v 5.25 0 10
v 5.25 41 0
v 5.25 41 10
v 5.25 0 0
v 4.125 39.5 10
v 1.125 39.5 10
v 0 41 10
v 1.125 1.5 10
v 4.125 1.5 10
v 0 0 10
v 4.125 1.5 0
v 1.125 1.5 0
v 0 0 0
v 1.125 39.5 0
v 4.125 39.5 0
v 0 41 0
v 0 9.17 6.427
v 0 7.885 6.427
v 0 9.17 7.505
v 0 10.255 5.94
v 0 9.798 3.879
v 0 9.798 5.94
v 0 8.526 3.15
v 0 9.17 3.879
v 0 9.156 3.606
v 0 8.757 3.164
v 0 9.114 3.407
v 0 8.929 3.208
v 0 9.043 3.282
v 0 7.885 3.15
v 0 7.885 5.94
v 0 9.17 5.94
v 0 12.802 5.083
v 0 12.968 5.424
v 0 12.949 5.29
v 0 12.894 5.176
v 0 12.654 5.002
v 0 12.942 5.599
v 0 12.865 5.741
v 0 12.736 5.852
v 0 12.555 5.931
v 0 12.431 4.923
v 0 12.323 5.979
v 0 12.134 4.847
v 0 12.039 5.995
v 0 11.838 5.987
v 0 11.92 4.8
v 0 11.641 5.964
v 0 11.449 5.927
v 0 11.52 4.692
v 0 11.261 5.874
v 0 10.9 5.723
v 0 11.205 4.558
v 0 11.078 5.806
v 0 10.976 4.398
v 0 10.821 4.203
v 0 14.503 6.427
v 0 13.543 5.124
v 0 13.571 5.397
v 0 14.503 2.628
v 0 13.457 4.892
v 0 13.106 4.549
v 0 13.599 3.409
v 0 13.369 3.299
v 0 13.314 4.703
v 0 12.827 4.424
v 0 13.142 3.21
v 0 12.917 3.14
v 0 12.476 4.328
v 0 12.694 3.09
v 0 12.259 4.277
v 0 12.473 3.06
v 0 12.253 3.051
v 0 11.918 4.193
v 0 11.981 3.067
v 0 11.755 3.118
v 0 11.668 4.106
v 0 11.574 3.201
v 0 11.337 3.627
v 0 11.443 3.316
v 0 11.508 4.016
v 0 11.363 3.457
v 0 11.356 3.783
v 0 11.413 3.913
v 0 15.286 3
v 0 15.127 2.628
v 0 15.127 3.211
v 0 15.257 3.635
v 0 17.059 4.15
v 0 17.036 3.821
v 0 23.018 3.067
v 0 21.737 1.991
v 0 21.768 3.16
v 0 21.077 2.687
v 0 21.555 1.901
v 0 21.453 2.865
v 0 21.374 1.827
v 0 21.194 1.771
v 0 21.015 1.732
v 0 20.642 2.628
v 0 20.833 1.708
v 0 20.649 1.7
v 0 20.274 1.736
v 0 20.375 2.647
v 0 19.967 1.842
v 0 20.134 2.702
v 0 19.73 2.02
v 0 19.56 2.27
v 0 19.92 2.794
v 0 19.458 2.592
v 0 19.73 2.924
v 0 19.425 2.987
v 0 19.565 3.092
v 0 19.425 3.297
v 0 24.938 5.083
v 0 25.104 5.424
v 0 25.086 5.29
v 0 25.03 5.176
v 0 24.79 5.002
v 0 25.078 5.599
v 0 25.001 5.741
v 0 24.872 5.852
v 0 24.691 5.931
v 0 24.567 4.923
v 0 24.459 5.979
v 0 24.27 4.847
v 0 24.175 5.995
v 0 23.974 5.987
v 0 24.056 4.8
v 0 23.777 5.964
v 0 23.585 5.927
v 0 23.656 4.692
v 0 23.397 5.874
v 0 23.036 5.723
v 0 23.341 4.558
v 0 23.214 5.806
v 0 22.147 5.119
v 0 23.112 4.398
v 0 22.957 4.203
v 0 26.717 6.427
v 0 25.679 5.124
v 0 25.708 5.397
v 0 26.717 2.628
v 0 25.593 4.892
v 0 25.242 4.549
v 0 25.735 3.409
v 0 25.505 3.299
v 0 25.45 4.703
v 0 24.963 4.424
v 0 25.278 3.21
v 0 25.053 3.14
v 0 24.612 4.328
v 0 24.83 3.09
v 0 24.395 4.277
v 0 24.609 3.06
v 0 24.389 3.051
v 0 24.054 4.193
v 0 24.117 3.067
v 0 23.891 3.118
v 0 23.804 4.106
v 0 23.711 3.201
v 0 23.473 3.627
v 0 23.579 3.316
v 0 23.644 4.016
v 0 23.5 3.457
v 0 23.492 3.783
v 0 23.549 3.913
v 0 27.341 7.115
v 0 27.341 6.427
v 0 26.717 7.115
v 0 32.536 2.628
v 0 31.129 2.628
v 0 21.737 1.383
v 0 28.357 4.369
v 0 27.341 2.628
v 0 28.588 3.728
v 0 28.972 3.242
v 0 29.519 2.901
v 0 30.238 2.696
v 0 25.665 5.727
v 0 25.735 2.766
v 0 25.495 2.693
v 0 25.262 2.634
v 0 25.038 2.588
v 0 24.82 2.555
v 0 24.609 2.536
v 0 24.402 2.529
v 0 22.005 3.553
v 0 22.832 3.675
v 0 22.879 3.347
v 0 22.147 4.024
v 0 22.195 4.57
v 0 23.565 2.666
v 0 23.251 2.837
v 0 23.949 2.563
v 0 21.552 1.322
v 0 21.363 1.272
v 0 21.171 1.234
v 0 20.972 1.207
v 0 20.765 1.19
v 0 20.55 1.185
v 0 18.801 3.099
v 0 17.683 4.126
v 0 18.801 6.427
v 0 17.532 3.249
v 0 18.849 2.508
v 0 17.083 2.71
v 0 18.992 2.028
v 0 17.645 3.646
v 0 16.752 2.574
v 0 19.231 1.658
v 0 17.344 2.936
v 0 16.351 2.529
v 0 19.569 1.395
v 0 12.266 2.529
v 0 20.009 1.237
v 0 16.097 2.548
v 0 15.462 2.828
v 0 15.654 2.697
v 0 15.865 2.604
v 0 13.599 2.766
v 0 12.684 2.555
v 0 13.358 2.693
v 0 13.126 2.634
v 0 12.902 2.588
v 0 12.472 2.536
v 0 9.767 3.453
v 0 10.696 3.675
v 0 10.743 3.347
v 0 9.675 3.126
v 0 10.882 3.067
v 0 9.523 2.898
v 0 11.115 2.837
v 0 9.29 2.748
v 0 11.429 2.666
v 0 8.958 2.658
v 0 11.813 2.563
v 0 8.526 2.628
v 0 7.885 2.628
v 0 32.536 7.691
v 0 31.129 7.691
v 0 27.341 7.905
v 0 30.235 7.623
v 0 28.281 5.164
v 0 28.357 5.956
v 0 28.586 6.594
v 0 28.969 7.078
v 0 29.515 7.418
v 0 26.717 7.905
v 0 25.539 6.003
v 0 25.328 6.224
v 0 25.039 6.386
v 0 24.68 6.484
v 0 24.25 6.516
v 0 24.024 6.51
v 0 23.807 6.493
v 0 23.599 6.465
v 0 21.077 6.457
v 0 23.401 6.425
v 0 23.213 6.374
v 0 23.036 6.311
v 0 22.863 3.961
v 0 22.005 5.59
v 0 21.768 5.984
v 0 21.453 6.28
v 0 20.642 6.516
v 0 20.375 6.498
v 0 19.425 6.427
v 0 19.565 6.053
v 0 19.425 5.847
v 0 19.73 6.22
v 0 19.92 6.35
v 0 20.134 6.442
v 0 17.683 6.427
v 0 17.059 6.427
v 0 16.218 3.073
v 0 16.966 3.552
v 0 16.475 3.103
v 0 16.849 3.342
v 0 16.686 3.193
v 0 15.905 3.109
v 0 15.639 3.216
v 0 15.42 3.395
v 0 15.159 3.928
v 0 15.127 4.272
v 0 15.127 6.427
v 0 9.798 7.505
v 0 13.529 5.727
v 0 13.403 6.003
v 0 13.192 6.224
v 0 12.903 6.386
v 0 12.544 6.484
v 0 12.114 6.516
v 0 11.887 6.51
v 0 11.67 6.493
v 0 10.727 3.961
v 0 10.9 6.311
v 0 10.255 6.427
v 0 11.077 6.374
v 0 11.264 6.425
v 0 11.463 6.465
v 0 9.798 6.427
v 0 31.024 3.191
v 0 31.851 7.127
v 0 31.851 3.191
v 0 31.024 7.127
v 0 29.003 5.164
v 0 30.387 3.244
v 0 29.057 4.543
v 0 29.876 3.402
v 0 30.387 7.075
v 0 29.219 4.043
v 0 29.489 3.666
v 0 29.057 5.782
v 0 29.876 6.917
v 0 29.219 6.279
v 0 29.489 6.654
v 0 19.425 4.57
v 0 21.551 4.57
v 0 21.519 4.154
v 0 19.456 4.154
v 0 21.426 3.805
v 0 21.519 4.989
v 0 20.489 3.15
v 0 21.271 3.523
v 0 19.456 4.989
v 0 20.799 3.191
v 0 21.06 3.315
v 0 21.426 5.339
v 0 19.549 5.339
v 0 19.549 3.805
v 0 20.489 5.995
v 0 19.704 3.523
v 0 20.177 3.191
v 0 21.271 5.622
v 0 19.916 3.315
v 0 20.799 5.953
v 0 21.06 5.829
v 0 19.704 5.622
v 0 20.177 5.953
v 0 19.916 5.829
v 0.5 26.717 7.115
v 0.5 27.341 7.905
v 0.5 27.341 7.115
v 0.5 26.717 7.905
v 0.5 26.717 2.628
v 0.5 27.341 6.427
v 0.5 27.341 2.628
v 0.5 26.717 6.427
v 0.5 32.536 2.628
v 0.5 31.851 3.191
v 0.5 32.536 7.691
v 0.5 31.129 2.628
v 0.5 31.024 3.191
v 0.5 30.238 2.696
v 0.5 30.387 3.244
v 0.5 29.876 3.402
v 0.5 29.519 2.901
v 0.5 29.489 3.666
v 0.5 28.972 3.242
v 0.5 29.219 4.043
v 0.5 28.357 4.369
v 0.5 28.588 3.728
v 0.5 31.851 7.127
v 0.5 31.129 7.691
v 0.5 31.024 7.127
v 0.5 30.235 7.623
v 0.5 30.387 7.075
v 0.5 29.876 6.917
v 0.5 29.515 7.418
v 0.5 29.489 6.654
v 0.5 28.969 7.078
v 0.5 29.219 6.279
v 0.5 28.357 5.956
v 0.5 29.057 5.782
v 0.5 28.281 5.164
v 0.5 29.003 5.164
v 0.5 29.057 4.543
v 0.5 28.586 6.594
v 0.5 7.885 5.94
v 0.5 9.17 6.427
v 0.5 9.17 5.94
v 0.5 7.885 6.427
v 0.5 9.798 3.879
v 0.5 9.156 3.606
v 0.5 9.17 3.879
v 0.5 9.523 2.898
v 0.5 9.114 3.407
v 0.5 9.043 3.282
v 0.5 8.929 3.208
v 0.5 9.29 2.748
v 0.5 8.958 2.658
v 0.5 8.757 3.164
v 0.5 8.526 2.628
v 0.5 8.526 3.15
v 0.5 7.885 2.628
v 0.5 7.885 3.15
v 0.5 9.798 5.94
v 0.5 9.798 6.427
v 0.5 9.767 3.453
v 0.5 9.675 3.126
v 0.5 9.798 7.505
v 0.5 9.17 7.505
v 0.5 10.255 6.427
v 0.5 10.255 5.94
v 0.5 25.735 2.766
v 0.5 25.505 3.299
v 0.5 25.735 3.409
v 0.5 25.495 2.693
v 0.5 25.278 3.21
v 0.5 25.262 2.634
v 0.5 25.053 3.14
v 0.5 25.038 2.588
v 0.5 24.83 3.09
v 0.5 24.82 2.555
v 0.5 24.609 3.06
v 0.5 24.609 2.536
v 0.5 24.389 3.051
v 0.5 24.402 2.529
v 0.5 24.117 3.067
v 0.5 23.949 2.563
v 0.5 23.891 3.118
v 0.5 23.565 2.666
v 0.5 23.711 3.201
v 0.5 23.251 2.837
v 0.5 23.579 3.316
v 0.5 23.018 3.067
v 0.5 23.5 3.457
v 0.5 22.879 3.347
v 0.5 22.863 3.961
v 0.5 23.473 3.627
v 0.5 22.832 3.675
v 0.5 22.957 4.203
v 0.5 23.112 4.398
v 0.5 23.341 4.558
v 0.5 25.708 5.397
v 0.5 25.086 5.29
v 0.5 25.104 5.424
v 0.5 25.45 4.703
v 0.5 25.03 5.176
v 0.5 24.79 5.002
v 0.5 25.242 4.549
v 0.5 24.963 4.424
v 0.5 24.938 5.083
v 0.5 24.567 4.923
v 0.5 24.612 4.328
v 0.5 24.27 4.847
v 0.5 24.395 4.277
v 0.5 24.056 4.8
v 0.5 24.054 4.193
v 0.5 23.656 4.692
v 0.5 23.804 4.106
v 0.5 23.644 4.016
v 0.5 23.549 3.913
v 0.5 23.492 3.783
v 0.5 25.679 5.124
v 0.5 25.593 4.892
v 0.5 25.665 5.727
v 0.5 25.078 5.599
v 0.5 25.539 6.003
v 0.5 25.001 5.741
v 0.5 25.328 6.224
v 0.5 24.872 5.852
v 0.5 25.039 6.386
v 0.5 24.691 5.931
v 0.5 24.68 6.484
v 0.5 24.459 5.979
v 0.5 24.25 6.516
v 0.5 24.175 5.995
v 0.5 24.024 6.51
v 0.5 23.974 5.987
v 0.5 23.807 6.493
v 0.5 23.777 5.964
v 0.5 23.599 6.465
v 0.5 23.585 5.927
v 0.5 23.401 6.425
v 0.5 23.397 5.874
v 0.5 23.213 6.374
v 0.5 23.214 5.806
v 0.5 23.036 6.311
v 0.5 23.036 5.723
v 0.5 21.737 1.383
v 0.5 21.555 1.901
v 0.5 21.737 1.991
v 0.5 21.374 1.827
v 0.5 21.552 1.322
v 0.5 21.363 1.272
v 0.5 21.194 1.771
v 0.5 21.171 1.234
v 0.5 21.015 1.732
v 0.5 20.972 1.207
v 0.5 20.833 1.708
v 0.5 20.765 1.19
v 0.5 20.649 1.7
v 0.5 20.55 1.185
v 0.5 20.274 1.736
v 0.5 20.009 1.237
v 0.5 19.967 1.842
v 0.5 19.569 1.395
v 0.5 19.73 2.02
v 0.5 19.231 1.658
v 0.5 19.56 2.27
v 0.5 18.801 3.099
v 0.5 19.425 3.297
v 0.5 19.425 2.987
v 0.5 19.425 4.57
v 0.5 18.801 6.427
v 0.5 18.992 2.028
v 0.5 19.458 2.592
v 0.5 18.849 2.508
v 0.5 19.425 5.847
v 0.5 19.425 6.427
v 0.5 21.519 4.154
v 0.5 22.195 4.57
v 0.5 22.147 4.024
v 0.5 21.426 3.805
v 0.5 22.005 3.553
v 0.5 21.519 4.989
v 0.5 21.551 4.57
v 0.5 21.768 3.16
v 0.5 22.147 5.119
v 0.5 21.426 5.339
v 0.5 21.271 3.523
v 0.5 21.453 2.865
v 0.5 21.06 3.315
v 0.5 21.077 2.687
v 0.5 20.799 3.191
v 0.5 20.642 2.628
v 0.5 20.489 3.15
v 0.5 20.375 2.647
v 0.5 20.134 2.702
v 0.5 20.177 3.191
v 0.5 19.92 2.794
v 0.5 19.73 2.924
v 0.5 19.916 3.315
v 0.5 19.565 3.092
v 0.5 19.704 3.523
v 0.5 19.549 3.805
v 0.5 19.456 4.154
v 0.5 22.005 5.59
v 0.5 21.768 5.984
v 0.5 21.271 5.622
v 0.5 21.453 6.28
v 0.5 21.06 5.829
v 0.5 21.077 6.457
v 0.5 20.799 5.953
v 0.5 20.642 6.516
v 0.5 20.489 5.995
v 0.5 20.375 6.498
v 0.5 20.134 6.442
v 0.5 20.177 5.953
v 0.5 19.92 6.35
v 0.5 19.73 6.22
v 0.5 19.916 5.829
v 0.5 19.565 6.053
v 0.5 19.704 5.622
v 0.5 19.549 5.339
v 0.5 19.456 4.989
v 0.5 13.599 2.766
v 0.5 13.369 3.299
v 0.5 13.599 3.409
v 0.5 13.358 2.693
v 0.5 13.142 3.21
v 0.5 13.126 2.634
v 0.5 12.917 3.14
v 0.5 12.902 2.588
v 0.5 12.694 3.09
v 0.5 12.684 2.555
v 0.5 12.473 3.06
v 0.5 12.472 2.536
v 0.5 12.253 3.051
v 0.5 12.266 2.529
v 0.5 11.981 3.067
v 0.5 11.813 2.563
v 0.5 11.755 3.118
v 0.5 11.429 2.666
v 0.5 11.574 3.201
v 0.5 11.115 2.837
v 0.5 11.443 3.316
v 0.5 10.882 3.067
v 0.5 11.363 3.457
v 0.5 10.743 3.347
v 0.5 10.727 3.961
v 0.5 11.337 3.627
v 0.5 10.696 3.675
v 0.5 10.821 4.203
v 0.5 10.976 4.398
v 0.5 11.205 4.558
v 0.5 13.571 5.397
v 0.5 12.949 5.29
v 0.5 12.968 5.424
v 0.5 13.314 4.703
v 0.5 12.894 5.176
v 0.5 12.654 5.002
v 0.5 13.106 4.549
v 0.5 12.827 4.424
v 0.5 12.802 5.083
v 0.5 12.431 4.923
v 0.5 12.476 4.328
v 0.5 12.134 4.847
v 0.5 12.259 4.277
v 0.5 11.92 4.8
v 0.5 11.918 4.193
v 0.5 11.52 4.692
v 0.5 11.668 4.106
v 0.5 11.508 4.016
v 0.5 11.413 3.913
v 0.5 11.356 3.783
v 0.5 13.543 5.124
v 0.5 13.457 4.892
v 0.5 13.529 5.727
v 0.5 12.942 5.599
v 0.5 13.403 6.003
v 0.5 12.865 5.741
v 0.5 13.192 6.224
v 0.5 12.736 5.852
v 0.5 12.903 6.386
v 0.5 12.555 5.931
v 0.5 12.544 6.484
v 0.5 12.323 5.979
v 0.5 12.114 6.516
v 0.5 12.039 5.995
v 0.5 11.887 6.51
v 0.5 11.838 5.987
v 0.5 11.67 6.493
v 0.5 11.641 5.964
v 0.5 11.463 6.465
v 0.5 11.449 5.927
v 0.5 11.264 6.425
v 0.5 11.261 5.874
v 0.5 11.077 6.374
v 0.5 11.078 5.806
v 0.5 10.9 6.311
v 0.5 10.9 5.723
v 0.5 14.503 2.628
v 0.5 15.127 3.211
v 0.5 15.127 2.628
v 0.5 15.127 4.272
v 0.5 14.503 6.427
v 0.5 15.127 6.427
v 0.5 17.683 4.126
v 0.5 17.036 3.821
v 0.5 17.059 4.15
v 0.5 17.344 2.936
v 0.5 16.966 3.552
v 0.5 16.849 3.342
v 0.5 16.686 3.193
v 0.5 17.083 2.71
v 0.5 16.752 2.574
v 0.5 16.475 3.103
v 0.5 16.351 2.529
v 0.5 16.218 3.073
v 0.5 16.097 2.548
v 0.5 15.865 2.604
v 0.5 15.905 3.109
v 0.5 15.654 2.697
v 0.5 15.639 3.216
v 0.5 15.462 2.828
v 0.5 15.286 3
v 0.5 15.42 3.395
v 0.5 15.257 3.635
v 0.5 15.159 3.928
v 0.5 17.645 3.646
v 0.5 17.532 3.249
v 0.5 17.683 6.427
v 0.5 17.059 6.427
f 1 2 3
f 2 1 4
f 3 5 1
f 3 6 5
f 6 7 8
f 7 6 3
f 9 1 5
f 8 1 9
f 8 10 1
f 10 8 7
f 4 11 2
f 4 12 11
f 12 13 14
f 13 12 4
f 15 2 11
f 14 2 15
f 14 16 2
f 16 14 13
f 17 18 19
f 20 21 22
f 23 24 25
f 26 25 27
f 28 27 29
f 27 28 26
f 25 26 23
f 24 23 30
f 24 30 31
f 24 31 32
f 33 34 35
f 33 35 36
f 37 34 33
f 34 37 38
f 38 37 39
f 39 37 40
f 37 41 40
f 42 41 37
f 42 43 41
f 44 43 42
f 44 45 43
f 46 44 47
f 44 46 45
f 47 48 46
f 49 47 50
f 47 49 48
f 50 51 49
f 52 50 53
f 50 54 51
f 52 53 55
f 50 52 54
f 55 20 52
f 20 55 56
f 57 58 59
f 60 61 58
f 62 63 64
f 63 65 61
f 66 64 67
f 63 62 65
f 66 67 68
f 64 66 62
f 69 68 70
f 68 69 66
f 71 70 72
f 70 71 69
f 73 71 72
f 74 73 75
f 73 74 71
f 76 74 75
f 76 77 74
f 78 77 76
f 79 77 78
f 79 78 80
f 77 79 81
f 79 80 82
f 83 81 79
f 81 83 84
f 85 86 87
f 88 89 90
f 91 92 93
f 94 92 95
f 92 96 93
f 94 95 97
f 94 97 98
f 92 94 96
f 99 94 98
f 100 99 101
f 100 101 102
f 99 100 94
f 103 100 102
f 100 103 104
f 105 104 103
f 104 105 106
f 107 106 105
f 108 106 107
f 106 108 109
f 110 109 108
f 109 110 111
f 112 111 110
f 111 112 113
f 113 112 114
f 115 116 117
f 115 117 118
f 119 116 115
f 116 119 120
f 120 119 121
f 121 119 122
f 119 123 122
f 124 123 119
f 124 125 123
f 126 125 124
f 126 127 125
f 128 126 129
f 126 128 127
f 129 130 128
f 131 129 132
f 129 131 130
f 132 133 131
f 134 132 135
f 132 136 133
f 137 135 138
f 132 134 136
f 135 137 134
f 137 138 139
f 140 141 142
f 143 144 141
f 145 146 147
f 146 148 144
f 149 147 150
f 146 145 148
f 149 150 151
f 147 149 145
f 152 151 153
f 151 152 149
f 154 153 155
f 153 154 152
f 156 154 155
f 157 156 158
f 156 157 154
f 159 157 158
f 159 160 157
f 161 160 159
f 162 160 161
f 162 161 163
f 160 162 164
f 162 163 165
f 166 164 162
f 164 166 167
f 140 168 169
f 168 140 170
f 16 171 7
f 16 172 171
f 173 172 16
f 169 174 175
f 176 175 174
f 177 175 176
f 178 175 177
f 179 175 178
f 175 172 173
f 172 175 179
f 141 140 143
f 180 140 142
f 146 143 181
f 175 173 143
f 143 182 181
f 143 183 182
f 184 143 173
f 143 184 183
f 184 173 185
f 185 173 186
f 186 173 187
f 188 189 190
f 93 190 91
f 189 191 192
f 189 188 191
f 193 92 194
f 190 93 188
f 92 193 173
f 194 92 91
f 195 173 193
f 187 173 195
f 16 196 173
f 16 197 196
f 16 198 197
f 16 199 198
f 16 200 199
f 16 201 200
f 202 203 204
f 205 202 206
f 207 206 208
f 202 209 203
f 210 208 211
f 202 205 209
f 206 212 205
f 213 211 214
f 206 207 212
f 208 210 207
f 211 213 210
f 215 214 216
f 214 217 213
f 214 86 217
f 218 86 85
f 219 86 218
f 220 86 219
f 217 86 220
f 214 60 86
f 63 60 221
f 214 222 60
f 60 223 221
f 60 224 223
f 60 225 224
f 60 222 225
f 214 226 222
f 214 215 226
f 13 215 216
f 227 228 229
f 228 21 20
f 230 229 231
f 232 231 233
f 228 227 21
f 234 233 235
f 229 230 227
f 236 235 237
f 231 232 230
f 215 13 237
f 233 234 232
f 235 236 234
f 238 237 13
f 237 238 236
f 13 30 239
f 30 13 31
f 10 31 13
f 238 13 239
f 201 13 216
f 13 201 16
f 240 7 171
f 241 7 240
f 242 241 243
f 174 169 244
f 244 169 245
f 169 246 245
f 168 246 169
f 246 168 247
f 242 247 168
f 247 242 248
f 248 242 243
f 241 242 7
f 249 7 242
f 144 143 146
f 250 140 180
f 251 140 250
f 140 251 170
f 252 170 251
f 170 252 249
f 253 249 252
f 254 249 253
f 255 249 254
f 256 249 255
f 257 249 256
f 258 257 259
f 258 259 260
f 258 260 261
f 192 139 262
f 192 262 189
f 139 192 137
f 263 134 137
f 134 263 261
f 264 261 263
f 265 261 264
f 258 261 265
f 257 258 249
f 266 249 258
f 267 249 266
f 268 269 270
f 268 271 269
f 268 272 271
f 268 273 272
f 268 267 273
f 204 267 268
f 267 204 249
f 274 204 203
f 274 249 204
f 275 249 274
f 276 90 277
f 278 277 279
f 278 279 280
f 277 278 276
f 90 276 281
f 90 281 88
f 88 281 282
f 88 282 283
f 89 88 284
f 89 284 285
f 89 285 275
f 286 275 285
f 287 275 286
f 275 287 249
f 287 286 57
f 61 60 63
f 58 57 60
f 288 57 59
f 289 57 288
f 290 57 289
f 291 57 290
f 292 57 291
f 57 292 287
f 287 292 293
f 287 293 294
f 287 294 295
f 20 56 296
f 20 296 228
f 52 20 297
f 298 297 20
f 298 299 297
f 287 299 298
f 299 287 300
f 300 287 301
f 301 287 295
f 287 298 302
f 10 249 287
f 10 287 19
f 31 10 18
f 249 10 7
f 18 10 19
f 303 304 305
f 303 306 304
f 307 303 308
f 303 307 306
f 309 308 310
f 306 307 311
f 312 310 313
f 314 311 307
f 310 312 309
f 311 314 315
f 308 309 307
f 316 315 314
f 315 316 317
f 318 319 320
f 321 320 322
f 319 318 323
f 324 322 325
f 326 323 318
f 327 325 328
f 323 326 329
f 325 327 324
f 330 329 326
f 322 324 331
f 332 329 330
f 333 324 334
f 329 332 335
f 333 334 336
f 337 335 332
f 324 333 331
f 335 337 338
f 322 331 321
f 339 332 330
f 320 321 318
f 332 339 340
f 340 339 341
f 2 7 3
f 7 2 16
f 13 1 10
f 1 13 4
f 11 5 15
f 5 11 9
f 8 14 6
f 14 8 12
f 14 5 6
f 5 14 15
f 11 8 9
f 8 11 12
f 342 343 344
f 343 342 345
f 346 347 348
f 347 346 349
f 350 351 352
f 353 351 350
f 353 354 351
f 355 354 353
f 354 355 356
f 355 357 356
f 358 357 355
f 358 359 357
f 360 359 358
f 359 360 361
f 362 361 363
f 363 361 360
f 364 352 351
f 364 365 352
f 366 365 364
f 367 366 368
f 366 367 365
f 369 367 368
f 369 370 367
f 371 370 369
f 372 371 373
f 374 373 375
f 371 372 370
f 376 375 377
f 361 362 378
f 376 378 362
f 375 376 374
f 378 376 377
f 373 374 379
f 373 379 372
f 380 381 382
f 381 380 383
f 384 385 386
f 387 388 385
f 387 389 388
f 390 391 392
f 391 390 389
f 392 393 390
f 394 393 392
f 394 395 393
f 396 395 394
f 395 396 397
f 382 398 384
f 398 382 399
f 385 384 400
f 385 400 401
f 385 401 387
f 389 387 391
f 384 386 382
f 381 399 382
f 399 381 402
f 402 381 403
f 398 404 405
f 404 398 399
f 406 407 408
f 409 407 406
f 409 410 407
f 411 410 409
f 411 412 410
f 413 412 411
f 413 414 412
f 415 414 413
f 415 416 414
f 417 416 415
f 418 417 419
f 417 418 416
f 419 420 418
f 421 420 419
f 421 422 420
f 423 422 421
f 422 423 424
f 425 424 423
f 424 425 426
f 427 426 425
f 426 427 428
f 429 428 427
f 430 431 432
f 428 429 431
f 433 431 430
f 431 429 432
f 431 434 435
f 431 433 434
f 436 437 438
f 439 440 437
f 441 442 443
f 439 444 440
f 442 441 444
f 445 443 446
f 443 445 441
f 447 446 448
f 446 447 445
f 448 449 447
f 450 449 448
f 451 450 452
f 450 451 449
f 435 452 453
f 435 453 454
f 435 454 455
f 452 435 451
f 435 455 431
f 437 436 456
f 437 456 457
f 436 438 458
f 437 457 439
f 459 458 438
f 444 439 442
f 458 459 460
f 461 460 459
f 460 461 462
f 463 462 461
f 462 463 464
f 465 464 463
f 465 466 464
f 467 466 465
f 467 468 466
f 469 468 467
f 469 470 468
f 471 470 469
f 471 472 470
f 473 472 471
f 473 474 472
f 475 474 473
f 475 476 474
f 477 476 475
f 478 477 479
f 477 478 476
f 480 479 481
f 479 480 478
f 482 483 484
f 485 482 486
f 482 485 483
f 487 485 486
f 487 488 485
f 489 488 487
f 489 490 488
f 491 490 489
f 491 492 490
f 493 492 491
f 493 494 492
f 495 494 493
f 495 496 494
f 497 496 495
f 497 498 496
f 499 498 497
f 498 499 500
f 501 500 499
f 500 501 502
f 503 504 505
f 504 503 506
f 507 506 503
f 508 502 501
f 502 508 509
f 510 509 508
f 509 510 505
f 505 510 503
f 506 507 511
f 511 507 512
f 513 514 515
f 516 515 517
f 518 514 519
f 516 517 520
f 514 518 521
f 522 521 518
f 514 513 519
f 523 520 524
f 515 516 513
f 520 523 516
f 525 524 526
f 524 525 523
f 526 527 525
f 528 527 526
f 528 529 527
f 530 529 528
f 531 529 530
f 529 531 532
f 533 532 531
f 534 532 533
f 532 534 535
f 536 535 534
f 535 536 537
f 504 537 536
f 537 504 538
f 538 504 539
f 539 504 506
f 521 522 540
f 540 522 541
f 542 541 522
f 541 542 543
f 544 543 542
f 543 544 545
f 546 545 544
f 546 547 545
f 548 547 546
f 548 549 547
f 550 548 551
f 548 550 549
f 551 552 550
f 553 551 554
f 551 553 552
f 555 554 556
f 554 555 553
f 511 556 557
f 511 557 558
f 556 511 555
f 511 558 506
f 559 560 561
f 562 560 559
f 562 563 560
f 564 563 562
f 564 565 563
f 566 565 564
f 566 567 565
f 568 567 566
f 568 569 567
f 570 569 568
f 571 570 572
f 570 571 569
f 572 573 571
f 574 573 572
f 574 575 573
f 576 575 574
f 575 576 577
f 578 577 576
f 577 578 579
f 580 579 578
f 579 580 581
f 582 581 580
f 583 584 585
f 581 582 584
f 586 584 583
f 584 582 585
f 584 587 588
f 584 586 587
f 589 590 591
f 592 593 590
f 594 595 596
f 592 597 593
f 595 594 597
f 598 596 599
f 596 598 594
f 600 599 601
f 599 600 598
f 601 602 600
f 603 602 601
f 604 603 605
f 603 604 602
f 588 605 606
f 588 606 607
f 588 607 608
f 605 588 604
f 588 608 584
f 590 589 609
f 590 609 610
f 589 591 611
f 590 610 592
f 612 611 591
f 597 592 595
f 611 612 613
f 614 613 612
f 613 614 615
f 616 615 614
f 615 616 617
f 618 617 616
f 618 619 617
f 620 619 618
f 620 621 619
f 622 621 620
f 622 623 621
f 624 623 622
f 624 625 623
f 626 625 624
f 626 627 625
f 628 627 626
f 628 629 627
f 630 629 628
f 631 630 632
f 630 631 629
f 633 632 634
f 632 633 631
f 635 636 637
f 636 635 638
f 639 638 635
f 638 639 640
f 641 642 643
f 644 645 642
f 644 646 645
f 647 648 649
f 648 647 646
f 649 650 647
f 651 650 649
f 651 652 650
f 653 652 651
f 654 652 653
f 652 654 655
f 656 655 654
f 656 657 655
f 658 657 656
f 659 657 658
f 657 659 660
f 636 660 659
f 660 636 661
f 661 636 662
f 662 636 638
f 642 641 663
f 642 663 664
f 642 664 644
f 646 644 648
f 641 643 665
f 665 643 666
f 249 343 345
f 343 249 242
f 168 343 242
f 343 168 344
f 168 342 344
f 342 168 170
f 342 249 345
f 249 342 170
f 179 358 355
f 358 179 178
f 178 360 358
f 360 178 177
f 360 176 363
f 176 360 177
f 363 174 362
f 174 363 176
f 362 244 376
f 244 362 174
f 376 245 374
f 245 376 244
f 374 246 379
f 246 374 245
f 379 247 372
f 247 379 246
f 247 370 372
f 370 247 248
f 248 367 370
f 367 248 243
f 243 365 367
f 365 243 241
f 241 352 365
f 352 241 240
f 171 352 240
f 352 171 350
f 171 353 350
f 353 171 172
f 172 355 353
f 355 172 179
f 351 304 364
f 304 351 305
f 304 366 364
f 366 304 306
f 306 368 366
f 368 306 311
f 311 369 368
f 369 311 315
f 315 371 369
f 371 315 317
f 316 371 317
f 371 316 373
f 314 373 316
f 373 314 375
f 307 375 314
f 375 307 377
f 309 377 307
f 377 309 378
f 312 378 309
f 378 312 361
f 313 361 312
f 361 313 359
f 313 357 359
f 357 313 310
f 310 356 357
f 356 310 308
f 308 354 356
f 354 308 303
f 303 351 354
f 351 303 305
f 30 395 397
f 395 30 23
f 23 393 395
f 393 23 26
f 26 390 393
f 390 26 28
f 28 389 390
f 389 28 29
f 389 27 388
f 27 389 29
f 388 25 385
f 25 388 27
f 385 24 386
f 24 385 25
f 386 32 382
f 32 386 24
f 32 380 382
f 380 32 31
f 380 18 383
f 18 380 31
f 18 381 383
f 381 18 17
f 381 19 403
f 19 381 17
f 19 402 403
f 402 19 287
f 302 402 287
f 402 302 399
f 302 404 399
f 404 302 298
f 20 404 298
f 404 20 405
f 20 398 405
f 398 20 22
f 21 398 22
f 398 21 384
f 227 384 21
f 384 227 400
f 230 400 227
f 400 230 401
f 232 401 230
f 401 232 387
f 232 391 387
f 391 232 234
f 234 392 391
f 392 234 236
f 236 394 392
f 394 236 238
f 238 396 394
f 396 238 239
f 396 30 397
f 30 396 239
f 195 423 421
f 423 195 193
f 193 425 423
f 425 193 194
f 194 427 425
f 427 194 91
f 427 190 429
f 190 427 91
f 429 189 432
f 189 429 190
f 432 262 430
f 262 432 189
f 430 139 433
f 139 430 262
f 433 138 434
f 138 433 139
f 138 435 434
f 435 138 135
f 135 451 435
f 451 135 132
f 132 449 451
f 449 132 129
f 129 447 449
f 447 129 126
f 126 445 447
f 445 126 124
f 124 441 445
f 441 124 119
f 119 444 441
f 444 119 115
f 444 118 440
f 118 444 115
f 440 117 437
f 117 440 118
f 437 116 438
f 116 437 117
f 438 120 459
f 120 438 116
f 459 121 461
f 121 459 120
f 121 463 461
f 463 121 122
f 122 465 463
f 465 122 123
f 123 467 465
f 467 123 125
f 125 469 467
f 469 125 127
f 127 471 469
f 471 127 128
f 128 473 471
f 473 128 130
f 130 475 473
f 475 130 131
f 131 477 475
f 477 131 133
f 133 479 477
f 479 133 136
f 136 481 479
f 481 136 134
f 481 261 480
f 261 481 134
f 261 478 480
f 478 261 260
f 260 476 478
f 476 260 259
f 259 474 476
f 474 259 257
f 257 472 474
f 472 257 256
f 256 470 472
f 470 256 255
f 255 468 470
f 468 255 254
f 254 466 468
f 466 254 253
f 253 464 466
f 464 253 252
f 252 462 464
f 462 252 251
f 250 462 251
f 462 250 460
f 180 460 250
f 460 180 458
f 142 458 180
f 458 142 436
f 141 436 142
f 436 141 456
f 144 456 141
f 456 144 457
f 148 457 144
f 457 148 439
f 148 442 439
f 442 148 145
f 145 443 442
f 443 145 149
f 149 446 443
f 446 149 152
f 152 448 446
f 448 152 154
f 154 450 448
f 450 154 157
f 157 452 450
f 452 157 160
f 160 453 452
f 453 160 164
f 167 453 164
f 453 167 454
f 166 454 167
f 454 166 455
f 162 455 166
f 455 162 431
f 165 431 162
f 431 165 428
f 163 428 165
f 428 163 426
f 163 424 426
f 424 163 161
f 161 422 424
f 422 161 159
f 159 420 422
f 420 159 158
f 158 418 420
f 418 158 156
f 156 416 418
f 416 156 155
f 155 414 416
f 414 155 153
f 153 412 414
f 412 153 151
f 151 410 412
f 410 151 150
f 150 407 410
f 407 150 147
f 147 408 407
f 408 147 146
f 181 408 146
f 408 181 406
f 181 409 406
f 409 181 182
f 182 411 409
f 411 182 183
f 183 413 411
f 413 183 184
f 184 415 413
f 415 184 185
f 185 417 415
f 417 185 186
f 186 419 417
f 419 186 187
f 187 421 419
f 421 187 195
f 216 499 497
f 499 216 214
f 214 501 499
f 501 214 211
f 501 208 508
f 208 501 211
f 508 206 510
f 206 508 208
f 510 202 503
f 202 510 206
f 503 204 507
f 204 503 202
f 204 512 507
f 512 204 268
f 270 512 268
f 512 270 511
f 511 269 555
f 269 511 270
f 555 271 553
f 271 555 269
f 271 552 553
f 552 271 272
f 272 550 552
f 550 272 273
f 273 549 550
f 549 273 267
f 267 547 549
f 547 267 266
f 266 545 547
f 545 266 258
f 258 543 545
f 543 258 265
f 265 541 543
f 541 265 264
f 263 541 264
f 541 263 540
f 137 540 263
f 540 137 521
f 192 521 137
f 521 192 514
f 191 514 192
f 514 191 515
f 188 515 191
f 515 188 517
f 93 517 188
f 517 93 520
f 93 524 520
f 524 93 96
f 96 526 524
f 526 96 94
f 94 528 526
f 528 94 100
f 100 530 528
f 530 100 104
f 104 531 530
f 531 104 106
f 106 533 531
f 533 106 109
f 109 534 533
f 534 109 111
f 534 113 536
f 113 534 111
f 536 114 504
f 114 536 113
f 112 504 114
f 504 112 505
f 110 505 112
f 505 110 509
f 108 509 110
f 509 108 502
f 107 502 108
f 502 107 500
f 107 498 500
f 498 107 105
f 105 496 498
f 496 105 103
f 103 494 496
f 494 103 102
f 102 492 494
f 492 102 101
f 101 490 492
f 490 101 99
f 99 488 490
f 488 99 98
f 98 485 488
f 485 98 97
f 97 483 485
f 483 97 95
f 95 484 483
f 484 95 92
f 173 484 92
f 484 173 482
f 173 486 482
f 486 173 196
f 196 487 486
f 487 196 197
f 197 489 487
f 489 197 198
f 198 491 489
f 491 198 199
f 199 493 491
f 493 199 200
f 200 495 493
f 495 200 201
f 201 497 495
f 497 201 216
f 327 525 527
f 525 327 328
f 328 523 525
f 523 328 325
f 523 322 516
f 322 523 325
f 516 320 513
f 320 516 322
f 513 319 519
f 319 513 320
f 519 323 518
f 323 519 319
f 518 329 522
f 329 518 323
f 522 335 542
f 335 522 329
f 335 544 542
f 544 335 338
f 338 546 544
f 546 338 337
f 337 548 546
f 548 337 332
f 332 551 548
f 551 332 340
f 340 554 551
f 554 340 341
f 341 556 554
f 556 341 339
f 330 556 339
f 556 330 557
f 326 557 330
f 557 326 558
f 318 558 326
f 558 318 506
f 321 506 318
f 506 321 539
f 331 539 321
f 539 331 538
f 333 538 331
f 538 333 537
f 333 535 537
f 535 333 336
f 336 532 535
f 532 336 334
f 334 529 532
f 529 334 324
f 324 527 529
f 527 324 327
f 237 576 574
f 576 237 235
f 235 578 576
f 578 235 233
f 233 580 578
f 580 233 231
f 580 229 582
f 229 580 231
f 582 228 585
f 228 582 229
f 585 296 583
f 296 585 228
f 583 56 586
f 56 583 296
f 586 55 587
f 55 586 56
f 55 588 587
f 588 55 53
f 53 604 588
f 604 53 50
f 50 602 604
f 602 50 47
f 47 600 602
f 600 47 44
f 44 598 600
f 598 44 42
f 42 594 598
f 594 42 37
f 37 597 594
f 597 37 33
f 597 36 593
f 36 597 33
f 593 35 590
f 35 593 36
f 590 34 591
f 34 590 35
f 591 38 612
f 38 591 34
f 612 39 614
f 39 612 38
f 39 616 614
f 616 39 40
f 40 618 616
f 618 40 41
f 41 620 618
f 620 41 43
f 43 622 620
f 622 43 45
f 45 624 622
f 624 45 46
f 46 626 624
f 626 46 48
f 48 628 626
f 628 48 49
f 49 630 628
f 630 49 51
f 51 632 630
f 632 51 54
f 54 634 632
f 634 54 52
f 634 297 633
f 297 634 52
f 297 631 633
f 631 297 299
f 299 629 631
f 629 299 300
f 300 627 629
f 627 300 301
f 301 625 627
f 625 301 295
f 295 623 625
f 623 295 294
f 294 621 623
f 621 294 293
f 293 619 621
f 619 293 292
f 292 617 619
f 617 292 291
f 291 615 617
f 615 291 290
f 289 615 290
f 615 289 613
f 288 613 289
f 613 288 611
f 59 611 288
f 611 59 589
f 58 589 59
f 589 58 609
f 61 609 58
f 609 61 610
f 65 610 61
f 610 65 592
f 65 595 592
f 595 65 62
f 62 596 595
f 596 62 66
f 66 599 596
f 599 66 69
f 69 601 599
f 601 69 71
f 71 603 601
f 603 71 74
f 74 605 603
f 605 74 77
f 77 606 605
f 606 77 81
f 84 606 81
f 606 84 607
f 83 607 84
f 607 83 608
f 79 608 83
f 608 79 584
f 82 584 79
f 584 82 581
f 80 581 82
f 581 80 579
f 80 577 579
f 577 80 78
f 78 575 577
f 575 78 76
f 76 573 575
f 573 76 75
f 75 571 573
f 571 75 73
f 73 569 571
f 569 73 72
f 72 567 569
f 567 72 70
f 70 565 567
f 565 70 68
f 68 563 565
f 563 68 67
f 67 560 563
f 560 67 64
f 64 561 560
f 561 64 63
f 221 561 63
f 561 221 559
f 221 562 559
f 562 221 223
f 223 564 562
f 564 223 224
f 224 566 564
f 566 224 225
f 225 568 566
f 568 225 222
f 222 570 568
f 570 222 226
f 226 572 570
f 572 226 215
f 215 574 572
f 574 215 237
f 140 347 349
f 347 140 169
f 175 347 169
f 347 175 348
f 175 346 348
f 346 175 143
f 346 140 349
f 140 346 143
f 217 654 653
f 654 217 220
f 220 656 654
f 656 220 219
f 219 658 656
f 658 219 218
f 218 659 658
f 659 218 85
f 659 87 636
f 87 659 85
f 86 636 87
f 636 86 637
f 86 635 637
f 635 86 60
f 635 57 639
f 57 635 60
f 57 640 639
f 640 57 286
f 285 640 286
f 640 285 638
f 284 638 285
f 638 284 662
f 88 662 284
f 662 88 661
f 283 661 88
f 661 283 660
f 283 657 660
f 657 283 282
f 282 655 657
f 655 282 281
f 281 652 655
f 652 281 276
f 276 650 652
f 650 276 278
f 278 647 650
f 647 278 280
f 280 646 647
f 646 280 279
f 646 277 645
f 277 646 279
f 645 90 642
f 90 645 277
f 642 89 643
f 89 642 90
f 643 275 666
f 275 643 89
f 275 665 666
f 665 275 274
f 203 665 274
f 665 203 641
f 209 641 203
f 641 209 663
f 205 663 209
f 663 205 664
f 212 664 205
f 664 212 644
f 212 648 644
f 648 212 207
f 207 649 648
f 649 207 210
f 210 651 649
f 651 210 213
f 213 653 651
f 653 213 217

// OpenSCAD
opening_x = 3;  // in mm
opening_y = 38;  // in mm

gap_x = 1/4;
gap_y = 1;

length_z = 10;  // in mm

wall_size = 1;


length_x = opening_x + gap_x + wall_size * 2;
length_y = opening_y + gap_y + wall_size * 2;

difference() {
    cube(size = [length_x, length_y, length_z]);

    translate([gap_x /2 + wall_size, gap_y/2 + wall_size, -1]) 
    cube([opening_x, opening_y, length_z + 2]);

    color("red")
    translate([0.5, length_y/2, length_z/2 - 1/2])
    rotate(a = [90, 0, 90])
    rotate(a = [0, 180, 0])
    linear_extrude(height = 0.5) {
        text(
            "Disgust",
            size = 5,
            font = "Aldo",
            halign = "center",
            valign = "center"
        );
    }
}
